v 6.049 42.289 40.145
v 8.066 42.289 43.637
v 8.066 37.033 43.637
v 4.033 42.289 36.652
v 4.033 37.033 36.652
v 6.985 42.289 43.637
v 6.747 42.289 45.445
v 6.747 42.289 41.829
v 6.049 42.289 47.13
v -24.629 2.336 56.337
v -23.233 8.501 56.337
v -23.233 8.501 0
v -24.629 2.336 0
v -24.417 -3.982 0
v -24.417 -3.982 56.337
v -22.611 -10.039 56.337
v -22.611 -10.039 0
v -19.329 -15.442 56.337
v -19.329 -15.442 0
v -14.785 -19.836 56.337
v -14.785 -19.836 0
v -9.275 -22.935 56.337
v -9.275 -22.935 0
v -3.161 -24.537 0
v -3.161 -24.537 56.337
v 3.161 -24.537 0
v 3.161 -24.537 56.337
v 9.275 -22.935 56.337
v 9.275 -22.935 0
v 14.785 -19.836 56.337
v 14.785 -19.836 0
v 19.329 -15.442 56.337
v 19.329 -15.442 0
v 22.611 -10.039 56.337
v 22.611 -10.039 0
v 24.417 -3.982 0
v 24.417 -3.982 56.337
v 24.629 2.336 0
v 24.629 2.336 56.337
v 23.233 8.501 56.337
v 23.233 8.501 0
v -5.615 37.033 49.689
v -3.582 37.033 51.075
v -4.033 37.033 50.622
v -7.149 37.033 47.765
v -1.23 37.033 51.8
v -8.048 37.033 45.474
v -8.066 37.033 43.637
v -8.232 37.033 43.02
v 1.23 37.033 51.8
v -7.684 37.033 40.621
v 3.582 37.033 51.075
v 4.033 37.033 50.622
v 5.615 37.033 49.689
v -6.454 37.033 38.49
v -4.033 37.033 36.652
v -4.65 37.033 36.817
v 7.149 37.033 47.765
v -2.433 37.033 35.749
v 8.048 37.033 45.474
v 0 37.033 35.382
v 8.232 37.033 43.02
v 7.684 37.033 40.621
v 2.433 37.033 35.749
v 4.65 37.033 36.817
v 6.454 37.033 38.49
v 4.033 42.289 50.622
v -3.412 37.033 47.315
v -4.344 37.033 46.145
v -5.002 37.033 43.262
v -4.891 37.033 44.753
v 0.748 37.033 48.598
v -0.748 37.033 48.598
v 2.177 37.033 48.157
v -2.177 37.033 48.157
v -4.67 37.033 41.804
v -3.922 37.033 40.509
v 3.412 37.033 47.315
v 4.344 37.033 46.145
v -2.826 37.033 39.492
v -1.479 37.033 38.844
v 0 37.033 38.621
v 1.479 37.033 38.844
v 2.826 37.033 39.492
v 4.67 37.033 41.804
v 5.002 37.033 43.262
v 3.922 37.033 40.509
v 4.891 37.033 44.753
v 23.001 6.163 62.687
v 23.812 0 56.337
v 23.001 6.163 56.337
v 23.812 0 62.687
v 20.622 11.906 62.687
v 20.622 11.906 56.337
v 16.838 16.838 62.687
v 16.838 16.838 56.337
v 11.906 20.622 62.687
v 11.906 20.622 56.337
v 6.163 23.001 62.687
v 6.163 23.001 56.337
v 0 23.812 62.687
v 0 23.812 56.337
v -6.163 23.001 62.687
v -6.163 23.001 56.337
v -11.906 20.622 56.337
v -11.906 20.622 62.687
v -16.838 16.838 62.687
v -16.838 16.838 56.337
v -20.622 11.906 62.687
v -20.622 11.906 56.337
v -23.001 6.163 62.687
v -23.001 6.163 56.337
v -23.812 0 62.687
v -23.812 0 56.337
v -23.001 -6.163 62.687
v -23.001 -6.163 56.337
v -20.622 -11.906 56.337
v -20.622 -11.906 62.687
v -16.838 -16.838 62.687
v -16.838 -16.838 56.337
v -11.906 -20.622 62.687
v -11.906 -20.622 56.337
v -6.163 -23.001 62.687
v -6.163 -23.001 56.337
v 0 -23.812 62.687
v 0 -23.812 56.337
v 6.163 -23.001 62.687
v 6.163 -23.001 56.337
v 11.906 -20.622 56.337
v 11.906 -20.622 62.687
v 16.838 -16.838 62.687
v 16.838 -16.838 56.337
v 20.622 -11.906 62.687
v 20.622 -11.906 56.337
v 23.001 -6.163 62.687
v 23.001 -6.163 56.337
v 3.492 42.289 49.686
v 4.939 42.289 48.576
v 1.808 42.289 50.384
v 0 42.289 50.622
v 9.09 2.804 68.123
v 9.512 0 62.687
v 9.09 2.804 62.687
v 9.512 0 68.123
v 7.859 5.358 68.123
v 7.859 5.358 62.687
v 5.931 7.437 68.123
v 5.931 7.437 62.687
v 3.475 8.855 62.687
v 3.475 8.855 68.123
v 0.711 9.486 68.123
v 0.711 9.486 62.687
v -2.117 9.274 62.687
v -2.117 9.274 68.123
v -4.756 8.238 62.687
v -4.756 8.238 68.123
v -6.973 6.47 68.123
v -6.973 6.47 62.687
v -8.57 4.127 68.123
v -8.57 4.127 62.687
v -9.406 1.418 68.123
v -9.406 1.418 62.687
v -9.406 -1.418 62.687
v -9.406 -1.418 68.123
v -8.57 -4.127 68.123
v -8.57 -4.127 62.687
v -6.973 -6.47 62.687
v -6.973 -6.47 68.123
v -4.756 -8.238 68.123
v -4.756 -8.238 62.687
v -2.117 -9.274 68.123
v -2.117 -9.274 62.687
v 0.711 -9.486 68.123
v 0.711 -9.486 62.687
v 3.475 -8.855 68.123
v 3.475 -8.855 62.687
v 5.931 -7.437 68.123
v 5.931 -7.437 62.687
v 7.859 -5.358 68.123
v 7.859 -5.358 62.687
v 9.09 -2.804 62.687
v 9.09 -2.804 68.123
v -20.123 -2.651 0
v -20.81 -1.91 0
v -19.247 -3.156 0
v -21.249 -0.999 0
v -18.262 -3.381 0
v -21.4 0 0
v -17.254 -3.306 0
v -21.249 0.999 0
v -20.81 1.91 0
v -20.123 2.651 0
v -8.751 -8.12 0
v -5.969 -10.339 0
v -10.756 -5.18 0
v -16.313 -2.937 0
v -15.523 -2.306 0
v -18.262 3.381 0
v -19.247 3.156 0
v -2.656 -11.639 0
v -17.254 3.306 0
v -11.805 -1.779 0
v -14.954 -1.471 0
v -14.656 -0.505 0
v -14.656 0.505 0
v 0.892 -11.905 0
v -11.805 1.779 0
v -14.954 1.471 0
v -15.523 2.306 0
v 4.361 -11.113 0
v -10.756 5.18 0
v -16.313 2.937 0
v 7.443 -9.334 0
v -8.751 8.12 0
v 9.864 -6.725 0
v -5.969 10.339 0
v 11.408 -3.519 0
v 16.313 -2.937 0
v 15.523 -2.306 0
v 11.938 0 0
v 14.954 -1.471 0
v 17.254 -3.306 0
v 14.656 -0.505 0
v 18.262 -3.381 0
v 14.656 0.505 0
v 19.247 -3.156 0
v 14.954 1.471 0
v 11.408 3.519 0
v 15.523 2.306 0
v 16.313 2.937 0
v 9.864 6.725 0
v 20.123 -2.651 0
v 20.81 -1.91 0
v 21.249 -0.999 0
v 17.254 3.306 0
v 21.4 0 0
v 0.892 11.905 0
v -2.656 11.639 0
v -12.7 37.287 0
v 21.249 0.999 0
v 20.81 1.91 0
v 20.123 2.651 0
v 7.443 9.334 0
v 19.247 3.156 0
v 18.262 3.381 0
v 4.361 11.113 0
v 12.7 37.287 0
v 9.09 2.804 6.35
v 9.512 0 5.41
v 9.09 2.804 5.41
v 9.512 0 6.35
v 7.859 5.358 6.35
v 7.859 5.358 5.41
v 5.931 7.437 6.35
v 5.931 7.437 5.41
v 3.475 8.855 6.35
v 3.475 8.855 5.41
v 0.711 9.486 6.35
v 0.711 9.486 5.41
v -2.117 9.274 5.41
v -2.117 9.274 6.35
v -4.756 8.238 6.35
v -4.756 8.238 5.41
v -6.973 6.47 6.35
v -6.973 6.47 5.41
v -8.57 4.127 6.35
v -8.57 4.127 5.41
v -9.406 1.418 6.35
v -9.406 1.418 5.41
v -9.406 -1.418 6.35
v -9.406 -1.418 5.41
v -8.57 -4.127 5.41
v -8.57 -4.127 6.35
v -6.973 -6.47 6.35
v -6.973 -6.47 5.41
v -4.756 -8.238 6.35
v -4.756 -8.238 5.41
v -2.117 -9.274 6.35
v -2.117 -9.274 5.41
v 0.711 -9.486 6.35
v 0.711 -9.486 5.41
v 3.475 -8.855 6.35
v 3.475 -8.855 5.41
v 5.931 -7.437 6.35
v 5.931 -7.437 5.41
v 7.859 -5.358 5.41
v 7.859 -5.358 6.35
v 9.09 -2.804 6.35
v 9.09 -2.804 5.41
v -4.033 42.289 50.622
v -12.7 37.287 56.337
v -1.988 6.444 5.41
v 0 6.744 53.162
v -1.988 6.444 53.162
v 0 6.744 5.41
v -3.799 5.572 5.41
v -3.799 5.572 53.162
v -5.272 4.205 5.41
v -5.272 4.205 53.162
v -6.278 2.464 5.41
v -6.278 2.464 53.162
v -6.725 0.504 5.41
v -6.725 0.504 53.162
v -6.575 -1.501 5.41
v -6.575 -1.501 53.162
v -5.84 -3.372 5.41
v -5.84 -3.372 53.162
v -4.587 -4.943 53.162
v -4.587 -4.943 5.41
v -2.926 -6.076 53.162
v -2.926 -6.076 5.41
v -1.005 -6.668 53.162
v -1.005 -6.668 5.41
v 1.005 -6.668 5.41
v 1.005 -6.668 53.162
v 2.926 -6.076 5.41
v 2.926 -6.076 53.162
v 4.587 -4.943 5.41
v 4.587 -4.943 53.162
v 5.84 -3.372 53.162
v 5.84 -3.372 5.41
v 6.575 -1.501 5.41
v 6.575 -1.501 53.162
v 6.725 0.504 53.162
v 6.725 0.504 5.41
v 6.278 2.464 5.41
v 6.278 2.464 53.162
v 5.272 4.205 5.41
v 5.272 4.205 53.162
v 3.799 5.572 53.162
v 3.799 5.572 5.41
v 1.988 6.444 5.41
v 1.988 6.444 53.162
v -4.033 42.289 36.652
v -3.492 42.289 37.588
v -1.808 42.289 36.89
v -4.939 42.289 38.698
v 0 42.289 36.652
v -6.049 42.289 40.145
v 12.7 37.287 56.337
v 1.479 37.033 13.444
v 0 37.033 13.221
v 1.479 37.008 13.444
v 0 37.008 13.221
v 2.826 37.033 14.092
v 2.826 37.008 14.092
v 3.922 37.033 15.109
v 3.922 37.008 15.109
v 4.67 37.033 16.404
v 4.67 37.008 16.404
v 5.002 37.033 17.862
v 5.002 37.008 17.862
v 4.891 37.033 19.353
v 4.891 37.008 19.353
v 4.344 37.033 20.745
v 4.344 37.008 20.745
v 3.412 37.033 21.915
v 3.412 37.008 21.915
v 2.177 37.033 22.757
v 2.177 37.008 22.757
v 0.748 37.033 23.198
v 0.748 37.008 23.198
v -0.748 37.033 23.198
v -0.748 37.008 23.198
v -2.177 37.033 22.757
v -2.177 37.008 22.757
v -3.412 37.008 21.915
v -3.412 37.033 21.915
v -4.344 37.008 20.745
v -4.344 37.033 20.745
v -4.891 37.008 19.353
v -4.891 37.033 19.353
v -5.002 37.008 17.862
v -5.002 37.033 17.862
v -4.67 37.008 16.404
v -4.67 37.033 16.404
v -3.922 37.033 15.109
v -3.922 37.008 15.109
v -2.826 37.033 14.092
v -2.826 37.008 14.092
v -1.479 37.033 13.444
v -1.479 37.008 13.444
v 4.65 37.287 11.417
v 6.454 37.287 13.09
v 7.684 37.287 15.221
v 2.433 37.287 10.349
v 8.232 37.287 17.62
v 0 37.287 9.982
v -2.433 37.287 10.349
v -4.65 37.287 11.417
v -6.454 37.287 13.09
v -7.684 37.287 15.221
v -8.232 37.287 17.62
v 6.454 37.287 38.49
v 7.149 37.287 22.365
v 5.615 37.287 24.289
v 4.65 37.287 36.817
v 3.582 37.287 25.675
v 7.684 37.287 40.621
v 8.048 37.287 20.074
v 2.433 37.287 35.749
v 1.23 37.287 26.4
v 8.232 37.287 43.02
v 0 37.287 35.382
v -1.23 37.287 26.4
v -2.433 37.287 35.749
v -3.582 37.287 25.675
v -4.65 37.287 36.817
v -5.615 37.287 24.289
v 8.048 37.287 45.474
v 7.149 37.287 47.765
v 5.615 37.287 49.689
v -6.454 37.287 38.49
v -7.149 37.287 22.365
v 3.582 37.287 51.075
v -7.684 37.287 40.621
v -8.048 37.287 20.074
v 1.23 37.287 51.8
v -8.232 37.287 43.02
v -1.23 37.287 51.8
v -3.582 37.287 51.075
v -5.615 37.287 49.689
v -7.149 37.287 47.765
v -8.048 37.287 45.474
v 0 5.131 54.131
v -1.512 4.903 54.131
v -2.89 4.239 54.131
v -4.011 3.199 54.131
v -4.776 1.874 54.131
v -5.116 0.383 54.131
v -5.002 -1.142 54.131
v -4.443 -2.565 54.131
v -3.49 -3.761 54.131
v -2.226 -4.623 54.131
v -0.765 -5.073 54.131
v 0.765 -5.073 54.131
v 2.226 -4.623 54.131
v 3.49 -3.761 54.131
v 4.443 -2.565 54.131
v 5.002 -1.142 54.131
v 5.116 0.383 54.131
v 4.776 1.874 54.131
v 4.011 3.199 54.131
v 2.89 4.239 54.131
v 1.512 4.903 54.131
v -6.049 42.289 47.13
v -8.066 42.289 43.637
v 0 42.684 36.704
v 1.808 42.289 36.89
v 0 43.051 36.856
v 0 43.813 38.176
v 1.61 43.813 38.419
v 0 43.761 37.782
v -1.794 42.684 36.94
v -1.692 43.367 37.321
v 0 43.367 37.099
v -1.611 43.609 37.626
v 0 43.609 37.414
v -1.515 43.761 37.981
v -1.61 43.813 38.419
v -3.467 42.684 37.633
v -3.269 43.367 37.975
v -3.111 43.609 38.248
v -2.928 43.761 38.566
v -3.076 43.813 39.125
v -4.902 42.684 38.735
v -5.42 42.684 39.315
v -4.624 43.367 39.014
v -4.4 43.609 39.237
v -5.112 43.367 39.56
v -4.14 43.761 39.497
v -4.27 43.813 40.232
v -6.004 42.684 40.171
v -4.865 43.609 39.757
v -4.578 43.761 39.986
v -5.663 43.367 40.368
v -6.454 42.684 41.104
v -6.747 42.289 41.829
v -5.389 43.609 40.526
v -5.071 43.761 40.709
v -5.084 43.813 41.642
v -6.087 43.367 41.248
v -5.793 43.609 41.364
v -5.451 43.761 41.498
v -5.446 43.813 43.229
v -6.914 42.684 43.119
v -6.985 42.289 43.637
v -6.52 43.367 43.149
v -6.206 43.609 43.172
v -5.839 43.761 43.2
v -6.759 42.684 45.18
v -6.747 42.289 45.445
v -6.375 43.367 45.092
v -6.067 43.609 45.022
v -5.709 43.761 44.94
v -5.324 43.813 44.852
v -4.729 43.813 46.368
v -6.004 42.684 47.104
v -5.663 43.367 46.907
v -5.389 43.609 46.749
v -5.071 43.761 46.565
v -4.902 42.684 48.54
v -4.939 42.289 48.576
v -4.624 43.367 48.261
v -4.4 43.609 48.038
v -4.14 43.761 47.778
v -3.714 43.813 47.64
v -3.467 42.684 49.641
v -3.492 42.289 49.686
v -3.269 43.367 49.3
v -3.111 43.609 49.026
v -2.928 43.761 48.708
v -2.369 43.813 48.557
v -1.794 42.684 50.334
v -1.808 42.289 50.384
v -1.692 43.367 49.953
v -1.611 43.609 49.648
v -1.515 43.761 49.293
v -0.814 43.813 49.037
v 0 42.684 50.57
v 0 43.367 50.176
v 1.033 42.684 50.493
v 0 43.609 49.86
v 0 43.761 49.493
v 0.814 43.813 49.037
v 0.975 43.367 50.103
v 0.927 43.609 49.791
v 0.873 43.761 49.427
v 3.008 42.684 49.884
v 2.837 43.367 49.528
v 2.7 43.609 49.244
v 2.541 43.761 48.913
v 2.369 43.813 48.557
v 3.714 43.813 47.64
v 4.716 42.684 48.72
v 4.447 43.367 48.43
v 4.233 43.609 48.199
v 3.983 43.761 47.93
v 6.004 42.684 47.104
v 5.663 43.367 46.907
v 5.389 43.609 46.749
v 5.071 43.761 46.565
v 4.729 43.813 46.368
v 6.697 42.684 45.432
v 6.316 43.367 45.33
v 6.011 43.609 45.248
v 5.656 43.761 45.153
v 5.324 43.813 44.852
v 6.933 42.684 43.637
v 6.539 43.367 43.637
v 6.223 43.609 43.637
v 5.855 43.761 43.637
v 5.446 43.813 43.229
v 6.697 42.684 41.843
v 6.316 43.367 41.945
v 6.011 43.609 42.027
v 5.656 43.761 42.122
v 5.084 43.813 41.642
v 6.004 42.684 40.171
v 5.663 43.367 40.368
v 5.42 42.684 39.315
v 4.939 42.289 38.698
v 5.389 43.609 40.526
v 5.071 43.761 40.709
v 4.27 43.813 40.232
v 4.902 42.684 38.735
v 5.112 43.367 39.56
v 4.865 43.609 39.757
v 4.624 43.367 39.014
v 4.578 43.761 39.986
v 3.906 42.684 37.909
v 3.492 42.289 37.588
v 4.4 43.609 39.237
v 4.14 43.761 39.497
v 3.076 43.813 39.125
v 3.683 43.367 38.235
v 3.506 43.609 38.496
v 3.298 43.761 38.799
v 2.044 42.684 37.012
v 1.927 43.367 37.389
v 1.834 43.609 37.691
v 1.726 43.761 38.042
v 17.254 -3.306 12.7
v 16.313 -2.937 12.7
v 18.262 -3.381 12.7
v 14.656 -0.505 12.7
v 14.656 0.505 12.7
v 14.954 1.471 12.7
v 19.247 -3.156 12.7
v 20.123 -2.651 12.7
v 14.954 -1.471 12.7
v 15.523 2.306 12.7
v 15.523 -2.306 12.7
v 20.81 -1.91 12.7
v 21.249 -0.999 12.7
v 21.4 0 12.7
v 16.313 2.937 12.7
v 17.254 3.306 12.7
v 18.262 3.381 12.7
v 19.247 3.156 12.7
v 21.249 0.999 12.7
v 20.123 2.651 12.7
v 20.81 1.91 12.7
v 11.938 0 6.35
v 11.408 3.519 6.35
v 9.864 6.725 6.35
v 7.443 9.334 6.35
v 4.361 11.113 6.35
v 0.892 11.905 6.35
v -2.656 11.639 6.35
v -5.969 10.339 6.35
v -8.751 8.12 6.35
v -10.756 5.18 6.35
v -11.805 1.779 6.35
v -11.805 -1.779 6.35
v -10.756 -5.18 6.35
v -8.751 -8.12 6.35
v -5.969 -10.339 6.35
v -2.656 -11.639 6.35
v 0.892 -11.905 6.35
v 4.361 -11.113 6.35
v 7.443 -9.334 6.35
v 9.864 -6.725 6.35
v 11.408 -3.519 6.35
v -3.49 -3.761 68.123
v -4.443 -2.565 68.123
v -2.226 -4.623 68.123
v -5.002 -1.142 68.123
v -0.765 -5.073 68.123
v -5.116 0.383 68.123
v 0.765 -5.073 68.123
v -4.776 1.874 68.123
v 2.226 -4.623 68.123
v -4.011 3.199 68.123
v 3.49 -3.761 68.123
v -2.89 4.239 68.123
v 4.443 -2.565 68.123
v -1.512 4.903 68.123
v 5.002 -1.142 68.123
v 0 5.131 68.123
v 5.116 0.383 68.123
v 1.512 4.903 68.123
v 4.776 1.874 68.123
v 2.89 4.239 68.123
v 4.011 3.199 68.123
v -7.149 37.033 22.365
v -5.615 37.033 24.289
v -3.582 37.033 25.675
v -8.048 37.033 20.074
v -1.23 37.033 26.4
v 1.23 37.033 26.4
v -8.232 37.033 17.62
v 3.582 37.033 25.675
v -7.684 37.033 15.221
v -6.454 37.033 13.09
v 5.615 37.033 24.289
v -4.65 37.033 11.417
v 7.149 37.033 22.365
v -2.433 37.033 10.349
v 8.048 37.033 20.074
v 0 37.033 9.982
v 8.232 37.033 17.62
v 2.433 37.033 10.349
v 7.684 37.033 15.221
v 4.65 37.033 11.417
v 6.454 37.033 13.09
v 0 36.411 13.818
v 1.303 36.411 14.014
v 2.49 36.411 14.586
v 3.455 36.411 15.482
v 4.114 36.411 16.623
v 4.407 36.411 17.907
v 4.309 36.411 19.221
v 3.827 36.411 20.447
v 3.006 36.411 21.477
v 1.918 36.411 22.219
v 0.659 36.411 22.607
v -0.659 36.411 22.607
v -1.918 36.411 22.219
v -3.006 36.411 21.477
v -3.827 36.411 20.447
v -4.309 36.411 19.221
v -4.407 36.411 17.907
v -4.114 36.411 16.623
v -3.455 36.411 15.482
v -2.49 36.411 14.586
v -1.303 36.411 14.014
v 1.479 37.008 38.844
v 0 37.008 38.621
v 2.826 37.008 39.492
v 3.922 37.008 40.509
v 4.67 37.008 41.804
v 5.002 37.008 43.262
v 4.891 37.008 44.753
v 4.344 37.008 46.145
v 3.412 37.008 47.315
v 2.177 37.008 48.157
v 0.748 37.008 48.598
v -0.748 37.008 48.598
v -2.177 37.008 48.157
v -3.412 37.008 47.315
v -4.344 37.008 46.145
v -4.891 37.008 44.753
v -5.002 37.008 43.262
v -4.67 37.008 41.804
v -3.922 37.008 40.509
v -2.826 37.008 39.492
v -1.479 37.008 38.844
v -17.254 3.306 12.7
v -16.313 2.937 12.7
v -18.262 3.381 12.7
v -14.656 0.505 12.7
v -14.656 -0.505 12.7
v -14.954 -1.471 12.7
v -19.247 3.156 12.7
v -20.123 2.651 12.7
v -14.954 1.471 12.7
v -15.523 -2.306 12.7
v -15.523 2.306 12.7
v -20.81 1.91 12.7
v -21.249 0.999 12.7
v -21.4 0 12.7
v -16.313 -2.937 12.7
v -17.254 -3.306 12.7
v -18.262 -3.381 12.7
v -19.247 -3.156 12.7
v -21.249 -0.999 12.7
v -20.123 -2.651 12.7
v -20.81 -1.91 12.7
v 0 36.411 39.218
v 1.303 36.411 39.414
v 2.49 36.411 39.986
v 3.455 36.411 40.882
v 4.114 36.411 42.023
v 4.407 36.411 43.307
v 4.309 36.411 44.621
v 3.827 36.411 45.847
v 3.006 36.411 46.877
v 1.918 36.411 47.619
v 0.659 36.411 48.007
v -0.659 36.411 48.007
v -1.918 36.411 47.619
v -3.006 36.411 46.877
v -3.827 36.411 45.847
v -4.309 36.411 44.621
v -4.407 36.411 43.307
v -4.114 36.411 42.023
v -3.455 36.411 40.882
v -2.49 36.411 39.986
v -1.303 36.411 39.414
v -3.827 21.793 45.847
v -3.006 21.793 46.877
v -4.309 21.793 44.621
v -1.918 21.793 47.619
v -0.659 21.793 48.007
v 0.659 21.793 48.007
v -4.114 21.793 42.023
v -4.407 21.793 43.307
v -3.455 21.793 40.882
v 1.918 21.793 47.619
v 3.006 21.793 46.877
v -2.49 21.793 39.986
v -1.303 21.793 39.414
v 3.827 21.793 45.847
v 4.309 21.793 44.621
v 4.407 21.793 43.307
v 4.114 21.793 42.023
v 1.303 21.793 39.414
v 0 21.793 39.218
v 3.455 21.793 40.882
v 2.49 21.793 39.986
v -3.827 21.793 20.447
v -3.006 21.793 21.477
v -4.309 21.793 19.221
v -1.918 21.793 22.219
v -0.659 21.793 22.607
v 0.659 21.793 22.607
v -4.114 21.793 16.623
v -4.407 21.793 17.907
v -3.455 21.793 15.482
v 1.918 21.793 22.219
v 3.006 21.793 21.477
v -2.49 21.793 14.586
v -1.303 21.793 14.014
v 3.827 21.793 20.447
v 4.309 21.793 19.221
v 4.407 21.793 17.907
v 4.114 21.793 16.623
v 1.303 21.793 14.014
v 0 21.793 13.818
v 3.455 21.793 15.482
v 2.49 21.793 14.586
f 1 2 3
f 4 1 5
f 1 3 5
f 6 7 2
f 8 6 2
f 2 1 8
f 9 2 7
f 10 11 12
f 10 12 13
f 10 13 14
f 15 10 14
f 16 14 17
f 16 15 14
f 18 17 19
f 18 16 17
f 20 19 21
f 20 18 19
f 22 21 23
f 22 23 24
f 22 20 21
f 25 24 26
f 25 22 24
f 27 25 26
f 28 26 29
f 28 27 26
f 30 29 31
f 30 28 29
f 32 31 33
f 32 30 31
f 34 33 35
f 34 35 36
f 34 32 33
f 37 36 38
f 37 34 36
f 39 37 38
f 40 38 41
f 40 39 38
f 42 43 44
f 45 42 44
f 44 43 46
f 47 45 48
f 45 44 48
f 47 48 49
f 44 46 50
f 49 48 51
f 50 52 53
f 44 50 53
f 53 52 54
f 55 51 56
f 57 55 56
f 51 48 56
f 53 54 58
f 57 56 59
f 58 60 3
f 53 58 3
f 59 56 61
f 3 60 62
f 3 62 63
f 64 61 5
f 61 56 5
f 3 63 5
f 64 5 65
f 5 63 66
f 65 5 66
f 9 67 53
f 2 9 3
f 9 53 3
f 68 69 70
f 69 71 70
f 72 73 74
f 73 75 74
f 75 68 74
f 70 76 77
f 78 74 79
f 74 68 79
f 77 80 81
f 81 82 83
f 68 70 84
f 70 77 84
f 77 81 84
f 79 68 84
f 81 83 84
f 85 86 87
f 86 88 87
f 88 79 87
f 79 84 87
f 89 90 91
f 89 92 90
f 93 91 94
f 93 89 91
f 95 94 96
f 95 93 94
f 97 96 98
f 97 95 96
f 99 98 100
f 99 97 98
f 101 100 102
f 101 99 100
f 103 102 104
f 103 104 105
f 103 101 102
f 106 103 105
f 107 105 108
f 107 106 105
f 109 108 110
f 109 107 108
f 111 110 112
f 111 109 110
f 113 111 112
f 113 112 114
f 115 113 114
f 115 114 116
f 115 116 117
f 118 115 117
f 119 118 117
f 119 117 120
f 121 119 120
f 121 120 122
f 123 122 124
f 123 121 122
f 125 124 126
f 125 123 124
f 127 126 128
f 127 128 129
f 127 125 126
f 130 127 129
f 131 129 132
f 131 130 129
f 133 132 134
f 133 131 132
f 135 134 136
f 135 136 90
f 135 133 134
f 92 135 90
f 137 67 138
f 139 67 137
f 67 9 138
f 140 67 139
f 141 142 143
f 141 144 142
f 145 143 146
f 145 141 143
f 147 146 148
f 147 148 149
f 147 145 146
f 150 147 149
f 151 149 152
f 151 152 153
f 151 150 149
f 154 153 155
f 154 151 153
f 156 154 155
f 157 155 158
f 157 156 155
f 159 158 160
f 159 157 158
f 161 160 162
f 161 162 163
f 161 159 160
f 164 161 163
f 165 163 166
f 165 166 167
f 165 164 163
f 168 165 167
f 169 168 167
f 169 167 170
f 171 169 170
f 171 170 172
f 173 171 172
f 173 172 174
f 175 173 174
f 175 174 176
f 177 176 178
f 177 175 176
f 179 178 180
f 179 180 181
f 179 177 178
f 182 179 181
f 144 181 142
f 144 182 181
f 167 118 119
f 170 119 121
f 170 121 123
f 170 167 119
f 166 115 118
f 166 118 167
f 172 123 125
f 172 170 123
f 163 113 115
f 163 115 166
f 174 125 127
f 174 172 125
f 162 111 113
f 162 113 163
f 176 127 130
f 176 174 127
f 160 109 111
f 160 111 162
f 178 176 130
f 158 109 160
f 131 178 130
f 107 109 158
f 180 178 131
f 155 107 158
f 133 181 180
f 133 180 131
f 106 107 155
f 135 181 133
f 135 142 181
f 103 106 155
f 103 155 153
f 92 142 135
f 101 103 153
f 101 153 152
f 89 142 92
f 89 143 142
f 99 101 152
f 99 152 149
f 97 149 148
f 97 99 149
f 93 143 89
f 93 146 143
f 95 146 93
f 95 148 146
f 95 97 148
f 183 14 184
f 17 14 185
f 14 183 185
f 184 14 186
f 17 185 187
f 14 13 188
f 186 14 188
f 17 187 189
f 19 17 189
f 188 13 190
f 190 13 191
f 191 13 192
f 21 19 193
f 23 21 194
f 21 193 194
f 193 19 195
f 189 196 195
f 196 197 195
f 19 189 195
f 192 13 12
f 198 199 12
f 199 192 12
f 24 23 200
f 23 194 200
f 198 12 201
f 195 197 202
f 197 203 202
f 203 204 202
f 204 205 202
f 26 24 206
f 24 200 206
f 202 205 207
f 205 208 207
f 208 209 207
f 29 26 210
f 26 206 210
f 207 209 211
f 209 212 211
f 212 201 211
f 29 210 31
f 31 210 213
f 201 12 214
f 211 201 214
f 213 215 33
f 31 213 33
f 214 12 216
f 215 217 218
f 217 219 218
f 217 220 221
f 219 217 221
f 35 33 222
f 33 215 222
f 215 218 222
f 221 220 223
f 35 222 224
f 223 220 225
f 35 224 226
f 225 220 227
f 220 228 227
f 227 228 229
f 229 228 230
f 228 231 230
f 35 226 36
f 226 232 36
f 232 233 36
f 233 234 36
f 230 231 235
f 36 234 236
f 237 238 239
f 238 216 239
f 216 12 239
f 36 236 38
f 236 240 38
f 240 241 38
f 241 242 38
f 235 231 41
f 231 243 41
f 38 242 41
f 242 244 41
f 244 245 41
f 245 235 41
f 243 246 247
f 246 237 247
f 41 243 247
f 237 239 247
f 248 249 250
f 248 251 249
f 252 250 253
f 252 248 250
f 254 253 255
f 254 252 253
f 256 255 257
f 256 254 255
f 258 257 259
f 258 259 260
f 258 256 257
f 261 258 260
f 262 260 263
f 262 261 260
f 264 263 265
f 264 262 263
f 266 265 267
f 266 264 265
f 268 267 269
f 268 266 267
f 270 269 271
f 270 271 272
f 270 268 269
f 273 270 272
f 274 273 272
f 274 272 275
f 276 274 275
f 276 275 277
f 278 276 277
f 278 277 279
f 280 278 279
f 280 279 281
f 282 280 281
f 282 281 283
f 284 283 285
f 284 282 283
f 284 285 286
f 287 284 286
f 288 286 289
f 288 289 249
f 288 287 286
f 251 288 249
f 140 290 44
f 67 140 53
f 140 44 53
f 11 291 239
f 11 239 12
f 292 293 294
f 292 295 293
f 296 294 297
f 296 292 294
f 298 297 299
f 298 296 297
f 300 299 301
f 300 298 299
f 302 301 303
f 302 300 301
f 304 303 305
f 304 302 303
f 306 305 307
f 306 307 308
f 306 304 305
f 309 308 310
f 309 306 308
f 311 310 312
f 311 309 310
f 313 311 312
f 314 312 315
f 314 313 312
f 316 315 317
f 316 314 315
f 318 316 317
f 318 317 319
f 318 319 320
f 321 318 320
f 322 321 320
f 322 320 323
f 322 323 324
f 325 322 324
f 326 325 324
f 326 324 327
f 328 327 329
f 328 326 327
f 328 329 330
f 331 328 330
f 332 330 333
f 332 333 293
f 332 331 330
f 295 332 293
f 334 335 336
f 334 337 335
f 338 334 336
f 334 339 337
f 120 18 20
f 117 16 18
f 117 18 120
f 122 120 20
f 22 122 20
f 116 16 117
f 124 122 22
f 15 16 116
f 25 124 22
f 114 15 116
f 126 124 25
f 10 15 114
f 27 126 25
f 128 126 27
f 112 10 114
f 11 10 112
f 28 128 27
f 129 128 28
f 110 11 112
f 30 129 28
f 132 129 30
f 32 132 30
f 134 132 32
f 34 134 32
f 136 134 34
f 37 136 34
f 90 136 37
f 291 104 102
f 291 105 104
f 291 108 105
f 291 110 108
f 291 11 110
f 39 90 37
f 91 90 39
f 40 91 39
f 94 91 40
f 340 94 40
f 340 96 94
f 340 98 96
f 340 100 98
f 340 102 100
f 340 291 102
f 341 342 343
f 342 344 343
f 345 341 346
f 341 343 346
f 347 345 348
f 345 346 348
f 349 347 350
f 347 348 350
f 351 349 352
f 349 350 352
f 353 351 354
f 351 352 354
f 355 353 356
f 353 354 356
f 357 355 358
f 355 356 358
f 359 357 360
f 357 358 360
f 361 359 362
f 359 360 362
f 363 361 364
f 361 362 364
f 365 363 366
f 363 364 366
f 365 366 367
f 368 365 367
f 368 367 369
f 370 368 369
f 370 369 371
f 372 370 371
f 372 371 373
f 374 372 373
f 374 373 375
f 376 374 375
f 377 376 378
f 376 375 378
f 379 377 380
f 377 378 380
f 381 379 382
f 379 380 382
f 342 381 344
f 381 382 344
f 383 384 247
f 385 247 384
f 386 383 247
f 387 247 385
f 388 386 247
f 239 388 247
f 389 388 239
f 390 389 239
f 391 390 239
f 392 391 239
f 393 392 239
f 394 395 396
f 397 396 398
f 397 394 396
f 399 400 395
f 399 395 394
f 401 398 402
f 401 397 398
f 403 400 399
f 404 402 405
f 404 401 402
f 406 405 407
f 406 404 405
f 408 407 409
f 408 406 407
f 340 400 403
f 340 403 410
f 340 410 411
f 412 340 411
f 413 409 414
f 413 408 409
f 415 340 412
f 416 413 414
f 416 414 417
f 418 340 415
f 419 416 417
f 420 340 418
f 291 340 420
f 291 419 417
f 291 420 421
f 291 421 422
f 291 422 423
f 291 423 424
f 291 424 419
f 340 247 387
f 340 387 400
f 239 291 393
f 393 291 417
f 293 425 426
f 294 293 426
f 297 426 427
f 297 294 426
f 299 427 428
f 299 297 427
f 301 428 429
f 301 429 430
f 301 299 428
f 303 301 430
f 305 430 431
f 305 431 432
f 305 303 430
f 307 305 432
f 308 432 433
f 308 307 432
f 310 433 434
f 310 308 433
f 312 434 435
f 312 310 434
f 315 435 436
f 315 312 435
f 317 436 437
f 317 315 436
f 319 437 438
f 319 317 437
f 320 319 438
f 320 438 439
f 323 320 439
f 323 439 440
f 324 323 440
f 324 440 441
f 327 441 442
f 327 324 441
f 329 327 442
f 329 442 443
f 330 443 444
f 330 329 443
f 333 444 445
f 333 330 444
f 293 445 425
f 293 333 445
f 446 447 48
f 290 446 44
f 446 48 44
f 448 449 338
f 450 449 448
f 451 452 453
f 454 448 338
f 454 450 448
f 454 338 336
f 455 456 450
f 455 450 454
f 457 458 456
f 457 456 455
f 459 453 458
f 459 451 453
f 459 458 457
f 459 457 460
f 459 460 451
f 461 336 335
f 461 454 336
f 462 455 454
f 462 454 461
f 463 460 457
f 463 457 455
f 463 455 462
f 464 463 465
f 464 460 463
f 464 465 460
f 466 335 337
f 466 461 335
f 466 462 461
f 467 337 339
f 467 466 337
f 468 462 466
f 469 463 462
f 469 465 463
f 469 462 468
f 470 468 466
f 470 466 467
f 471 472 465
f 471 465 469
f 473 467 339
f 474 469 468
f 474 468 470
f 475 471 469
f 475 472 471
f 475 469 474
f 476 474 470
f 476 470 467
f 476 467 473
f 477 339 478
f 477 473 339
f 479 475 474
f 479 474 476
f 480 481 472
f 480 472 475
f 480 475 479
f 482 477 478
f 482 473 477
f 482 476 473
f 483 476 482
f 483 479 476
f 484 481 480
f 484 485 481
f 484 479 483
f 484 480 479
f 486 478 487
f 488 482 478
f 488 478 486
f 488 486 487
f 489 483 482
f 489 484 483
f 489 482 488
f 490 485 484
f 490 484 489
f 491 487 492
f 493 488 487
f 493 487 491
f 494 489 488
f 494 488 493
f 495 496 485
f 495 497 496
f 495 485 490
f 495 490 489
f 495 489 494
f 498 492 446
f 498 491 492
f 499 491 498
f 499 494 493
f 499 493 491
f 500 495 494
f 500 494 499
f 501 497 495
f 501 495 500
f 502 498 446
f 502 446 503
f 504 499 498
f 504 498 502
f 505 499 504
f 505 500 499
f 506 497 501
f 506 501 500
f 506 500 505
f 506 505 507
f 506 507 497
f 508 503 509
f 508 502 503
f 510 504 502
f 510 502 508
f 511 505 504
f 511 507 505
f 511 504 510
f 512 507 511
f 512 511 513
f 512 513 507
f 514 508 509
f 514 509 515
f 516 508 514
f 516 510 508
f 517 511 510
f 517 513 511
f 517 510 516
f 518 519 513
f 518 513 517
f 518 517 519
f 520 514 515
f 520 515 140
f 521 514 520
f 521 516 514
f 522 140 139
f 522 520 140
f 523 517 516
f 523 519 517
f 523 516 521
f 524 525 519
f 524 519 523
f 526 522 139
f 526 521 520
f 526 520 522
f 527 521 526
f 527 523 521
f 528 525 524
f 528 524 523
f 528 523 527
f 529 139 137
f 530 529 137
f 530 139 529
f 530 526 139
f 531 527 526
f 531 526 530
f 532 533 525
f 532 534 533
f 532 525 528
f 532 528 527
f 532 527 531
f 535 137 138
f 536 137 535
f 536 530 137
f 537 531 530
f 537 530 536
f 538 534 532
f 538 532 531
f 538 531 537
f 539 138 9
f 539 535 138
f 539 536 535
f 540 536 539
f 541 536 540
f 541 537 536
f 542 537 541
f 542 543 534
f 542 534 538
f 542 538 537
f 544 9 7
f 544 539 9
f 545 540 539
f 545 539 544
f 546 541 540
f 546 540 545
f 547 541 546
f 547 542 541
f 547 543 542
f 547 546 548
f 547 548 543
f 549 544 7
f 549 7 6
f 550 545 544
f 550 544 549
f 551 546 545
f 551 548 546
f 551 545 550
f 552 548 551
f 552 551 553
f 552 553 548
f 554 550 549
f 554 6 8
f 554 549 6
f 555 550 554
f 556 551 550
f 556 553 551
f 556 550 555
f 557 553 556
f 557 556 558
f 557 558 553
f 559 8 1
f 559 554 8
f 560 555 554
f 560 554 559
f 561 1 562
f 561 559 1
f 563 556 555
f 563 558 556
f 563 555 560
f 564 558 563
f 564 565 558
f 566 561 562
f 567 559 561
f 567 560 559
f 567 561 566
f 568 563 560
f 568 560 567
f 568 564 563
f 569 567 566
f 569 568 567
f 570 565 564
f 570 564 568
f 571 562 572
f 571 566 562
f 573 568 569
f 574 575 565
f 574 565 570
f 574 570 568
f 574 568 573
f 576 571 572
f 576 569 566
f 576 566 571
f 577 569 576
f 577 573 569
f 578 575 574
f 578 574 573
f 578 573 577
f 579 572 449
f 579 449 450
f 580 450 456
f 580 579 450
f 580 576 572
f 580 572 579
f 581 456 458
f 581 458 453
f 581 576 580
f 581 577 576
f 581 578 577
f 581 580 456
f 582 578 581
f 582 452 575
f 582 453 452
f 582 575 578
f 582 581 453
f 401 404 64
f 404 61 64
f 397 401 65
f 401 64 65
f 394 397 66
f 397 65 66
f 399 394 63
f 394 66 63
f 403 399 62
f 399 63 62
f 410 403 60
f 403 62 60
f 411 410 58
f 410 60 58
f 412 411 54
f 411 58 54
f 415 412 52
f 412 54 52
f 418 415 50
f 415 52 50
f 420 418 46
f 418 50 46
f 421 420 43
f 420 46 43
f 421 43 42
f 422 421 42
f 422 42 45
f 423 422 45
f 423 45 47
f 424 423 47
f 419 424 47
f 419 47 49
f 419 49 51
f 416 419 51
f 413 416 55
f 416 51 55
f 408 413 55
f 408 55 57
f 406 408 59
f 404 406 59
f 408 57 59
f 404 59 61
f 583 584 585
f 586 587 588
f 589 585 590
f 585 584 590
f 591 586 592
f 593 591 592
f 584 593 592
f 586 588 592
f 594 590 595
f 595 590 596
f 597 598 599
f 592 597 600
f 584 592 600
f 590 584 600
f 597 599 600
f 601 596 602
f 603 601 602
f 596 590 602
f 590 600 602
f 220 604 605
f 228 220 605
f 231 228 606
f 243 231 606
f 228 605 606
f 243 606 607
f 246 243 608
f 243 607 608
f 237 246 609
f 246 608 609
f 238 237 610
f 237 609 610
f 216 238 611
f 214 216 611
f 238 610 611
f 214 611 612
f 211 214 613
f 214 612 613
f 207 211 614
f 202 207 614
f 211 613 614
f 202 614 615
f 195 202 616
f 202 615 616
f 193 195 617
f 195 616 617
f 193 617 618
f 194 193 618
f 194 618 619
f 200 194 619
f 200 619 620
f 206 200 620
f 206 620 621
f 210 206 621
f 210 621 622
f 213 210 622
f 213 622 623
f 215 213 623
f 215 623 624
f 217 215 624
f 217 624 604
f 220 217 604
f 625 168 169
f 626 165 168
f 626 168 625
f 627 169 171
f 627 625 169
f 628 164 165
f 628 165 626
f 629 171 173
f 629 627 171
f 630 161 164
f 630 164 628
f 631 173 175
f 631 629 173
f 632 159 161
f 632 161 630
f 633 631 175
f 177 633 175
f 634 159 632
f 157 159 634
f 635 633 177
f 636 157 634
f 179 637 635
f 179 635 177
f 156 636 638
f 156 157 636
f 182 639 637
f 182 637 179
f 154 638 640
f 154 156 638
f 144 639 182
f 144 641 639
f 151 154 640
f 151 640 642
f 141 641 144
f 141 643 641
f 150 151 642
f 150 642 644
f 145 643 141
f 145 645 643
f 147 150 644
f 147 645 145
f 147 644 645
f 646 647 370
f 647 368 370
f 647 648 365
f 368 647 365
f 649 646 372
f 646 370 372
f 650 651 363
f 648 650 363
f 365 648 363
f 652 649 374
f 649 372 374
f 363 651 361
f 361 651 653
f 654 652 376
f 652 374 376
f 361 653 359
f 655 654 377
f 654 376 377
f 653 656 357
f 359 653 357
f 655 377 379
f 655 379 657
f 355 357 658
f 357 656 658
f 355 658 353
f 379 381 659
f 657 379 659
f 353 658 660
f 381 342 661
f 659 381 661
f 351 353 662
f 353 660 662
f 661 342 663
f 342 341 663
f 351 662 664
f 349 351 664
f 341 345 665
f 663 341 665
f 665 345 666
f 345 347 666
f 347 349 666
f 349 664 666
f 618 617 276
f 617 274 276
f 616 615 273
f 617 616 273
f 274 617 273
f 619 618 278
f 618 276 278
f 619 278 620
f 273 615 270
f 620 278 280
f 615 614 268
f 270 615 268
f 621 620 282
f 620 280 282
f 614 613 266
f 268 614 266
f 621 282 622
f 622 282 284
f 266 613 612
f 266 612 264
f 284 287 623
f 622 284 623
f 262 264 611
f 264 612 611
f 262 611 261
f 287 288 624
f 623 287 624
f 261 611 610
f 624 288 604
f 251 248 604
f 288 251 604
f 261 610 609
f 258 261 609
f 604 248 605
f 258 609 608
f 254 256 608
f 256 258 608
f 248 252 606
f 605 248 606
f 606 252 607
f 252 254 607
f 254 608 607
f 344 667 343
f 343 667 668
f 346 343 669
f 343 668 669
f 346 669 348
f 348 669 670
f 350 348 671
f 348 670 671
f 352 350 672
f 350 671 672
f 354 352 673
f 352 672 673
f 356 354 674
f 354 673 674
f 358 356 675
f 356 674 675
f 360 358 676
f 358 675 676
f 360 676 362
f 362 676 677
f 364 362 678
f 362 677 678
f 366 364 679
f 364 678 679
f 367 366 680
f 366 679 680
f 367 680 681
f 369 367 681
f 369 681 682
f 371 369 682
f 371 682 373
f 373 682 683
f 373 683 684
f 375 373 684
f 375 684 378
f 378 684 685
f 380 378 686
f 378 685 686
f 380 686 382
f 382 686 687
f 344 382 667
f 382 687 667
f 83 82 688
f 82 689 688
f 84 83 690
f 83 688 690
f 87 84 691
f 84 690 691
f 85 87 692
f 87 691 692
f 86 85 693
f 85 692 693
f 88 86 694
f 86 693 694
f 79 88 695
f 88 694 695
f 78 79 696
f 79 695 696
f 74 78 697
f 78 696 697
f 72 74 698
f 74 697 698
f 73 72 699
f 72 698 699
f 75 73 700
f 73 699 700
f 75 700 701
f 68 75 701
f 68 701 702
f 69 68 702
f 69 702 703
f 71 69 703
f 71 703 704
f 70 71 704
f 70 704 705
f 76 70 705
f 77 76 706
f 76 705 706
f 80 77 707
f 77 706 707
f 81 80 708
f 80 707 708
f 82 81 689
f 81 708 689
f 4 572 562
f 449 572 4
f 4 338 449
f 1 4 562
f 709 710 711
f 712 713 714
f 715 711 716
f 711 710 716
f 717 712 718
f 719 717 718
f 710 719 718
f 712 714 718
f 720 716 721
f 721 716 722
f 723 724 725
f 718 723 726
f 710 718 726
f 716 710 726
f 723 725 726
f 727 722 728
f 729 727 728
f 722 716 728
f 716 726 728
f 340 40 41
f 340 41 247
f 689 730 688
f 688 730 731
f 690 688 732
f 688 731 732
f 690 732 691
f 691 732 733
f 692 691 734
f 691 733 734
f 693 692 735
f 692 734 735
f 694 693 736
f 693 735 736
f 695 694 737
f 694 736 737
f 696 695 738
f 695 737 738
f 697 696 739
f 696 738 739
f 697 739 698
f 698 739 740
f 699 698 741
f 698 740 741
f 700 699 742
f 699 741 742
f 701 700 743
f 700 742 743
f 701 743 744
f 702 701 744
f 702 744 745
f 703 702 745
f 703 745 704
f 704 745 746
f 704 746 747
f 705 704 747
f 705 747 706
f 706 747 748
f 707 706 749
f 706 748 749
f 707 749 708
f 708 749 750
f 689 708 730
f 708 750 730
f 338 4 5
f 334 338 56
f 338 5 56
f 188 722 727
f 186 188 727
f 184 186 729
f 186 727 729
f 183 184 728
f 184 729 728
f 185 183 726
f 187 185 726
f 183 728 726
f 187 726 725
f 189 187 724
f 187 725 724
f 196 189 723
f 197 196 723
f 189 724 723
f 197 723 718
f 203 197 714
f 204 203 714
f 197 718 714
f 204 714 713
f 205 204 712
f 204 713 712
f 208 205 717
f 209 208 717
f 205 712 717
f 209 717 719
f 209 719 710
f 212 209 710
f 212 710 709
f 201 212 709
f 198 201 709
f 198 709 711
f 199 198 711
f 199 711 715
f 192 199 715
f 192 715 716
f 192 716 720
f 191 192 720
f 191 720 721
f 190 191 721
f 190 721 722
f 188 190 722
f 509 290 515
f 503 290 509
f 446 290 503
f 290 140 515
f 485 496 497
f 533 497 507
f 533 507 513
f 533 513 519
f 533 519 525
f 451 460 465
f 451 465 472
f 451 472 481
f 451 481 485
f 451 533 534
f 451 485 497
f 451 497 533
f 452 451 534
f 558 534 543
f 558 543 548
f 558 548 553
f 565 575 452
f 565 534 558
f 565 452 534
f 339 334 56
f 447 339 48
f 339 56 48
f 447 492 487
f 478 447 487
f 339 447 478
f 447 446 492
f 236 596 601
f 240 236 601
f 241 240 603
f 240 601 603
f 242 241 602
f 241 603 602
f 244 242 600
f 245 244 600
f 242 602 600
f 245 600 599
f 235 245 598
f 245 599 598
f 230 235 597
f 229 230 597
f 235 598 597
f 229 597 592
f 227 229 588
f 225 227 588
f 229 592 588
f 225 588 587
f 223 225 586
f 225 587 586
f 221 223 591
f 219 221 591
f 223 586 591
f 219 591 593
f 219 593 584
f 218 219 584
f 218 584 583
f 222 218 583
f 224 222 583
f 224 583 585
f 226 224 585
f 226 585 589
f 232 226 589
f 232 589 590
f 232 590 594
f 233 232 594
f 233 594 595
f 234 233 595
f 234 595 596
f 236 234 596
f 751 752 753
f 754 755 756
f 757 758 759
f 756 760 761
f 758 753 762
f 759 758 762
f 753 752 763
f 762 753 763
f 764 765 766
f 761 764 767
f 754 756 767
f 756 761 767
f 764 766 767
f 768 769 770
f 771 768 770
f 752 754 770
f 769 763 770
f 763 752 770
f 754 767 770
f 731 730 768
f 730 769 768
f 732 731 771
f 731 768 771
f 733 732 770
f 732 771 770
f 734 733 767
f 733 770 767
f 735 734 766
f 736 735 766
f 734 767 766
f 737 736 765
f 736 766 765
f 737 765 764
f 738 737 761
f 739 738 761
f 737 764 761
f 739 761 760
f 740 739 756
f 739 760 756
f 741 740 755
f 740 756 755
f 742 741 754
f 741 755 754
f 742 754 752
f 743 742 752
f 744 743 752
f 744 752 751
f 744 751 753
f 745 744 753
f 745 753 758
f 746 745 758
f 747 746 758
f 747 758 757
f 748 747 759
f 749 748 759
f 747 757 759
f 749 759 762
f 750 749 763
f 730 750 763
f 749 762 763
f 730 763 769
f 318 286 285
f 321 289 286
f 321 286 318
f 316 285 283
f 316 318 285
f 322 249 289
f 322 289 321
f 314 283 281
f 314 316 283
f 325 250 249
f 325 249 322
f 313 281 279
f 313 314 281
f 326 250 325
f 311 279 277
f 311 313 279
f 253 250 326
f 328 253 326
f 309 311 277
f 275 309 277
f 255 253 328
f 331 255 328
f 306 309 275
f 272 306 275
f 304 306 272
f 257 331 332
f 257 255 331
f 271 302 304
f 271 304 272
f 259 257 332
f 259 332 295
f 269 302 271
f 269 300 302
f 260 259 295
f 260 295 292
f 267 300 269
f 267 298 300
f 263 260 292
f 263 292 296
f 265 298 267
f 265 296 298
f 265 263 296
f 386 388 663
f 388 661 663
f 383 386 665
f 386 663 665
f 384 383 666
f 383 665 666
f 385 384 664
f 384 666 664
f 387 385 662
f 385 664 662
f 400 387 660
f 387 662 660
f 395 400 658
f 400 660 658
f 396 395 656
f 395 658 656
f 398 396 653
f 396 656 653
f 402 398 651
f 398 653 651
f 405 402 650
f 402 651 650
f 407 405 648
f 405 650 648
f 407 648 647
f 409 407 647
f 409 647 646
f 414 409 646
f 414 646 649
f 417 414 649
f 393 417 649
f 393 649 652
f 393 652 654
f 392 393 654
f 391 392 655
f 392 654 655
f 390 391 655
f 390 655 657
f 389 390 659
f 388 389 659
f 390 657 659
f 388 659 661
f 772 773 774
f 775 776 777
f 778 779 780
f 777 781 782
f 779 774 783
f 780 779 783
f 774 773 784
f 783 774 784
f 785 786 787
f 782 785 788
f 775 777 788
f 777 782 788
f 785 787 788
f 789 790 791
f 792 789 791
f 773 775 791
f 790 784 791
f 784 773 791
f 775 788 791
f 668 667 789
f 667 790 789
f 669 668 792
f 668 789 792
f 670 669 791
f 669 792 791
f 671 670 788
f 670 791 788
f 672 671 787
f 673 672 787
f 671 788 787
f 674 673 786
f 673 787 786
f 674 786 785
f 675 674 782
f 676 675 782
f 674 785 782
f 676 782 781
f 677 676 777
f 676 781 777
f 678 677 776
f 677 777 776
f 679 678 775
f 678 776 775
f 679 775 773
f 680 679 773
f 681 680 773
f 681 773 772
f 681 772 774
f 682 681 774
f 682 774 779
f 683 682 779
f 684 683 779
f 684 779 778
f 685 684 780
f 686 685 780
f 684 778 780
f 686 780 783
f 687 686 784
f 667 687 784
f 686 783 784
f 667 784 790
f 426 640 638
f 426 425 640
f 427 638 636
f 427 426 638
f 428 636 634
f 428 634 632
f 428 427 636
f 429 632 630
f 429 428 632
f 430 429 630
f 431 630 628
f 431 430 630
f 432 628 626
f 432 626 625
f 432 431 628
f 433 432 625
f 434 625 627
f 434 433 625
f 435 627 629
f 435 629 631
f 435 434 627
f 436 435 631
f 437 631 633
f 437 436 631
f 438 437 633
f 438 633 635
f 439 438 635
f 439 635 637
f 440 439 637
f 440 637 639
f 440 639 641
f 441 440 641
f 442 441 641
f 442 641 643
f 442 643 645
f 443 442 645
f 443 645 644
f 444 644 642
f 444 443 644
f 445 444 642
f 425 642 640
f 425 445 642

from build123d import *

# Parameters (mm, degrees)
EXTRUDE1_DEPTH    = 56.3372
HOLE2_D           = 23.876
HOLE2_DEPTH       = 6.35
SKETCH6_W         = 9.5123
SKETCH6_H         = 0.9398
HOLE3_D           = 6.7818
HOLE3_DEPTH       = 12.7
CIRPATTERN1_COUNT = 2
LPATTERN1_COUNT   = 2
LPATTERN1_PITCH   = 25.4
EXTRUDE2_DEPTH    = 6.78


with BuildPart() as part:
    # Sketch1 → Extrude1 (new body)
    with BuildSketch(Plane.XY.offset(56.3372)):
        with BuildLine():
            Line((23.233094839, 8.501241812), (12.7, 37.2872))
            Line((12.7, 37.2872), (-12.7, 37.2872))
            Line((-12.7, 37.2872), (-23.233094839, 8.501241812))
            ThreePointArc((-23.233094839, 8.501241812), (0, -24.7396), (23.233094839, 8.501241812))
        make_face()
    extrude(amount=-EXTRUDE1_DEPTH)

    # Hole2
    with Locations(Plane(origin=(0, 0, 0), x_dir=(-1, 0, 0), z_dir=(0, 0, -1))):
        with Locations((0, 0)):
            Hole(HOLE2_D / 2, depth=HOLE2_DEPTH)

    # Sketch7 → Revolve2 (revolve)
    with BuildSketch(Plane.XZ):
        Polygon((9.5123, 68.1228), (0, 68.1228), (0, 56.3372), (23.8125, 56.3372), (23.8125, 62.6872), (9.5123, 62.6872), align=None)
    revolve(axis=Axis((0, 0, 0), (0, 0, 1)))

    # Sketch6 → Revolve1 (revolve)
    with BuildSketch(Plane.XZ):
        with Locations((4.75615, 5.8801)):
            Rectangle(SKETCH6_W, SKETCH6_H)
    revolve(axis=Axis((0, 0, 0), (0, 0, 1)))

    # Sketch9 → Cut-Revolve1 (revolve, cut)
    with BuildSketch(Plane.XY.offset(18.2372), mode=Mode.PRIVATE) as cut_revolve1_sk:
        Polygon((-4.4196, 21.7932), (0, 21.7932), (0, 37.2872), (-8.255, 37.2872), (-8.255, 37.0332), (-5.0165, 37.0332), (-5.0165, 37.0078), (-4.4196, 36.4109), align=None)
    cut_revolve1 = revolve(cut_revolve1_sk.sketch.rotate(Axis((0, 37.2872, 18.2372), (0, -1, 0)), 90), axis=Axis((0, 37.2872, 18.2372), (0, -1, 0)), mode=Mode.SUBTRACT)  # turned: the seam where the file's is

    # Hole3
    with Locations(Plane(origin=(0, 0, 0), x_dir=(-1, 0, 0), z_dir=(0, 0, -1))):
        with Locations((-18.0086, 0)):
            hole3 = Hole(HOLE3_D / 2, depth=HOLE3_DEPTH)

    # CirPattern1: Hole3 ×2 about axis
    cirpattern1_axis = Axis((0, 0, 0), (0, 0, 1))
    for i in range(1, CIRPATTERN1_COUNT):
        add(hole3.rotate(cirpattern1_axis, i * 360 / CIRPATTERN1_COUNT), mode=Mode.SUBTRACT)

    # Sketch15 → Hole5 (revolve, cut)
    with BuildSketch(Plane(origin=(0, 0, 5.4102), x_dir=(0, 1, 0), z_dir=(1, 0, 0))):
        Polygon((0, 0), (0, 62.7126), (5.1308, 62.7126), (5.1308, 48.721128092), (6.7437, 47.752), (6.7437, 0), align=None)
    revolve(axis=Axis((0, 0, -0.719823899), (0, 0, 1)), mode=Mode.SUBTRACT)

    # LPattern1: Cut-Revolve1 ×2
    with Locations(*[(0, 0, i * LPATTERN1_PITCH) for i in range(1, LPATTERN1_COUNT)]):
        add(cut_revolve1, mode=Mode.SUBTRACT)

    # Sketch17 → Extrude2 (add)
    with BuildSketch(Plane(origin=(0, 37.0332, 0), x_dir=(1, 0, 0), z_dir=(0, 1, 0))):
        Polygon((8.065583261, -43.6372), (4.03279163, -36.6522), (-4.03279163, -36.6522), (-8.065583261, -43.6372), (-4.03279163, -50.6222), (4.03279163, -50.6222), align=None)
    extrude(amount=EXTRUDE2_DEPTH)

    # Sketch18 → Cut-Revolve2 (revolve, cut)
    with BuildSketch(Plane(origin=(0, 0, 0), x_dir=(0, 0, -1), z_dir=(1, 0, 0)), mode=Mode.PRIVATE) as cut_revolve2_sk:
        with BuildLine():
            Line((-49.0982, 43.8132), (-49.0982, 46.8132))
            Line((-49.0982, 46.8132), (-53.6222, 46.8132))
            Line((-53.6222, 46.8132), (-53.6222, 42.2892))
            Line((-53.6222, 42.2892), (-50.6222, 42.2892))
            ThreePointArc((-50.6222, 42.2892), (-50.175830735, 43.366830735), (-49.0982, 43.8132))
        make_face()
    revolve(cut_revolve2_sk.sketch.rotate(Axis((0, 21.7932, 43.6372), (0, 1, 0)), 180), axis=Axis((0, 21.7932, 43.6372), (0, 1, 0)), mode=Mode.SUBTRACT)  # turned: the seam where the file's is


solid = part.part
